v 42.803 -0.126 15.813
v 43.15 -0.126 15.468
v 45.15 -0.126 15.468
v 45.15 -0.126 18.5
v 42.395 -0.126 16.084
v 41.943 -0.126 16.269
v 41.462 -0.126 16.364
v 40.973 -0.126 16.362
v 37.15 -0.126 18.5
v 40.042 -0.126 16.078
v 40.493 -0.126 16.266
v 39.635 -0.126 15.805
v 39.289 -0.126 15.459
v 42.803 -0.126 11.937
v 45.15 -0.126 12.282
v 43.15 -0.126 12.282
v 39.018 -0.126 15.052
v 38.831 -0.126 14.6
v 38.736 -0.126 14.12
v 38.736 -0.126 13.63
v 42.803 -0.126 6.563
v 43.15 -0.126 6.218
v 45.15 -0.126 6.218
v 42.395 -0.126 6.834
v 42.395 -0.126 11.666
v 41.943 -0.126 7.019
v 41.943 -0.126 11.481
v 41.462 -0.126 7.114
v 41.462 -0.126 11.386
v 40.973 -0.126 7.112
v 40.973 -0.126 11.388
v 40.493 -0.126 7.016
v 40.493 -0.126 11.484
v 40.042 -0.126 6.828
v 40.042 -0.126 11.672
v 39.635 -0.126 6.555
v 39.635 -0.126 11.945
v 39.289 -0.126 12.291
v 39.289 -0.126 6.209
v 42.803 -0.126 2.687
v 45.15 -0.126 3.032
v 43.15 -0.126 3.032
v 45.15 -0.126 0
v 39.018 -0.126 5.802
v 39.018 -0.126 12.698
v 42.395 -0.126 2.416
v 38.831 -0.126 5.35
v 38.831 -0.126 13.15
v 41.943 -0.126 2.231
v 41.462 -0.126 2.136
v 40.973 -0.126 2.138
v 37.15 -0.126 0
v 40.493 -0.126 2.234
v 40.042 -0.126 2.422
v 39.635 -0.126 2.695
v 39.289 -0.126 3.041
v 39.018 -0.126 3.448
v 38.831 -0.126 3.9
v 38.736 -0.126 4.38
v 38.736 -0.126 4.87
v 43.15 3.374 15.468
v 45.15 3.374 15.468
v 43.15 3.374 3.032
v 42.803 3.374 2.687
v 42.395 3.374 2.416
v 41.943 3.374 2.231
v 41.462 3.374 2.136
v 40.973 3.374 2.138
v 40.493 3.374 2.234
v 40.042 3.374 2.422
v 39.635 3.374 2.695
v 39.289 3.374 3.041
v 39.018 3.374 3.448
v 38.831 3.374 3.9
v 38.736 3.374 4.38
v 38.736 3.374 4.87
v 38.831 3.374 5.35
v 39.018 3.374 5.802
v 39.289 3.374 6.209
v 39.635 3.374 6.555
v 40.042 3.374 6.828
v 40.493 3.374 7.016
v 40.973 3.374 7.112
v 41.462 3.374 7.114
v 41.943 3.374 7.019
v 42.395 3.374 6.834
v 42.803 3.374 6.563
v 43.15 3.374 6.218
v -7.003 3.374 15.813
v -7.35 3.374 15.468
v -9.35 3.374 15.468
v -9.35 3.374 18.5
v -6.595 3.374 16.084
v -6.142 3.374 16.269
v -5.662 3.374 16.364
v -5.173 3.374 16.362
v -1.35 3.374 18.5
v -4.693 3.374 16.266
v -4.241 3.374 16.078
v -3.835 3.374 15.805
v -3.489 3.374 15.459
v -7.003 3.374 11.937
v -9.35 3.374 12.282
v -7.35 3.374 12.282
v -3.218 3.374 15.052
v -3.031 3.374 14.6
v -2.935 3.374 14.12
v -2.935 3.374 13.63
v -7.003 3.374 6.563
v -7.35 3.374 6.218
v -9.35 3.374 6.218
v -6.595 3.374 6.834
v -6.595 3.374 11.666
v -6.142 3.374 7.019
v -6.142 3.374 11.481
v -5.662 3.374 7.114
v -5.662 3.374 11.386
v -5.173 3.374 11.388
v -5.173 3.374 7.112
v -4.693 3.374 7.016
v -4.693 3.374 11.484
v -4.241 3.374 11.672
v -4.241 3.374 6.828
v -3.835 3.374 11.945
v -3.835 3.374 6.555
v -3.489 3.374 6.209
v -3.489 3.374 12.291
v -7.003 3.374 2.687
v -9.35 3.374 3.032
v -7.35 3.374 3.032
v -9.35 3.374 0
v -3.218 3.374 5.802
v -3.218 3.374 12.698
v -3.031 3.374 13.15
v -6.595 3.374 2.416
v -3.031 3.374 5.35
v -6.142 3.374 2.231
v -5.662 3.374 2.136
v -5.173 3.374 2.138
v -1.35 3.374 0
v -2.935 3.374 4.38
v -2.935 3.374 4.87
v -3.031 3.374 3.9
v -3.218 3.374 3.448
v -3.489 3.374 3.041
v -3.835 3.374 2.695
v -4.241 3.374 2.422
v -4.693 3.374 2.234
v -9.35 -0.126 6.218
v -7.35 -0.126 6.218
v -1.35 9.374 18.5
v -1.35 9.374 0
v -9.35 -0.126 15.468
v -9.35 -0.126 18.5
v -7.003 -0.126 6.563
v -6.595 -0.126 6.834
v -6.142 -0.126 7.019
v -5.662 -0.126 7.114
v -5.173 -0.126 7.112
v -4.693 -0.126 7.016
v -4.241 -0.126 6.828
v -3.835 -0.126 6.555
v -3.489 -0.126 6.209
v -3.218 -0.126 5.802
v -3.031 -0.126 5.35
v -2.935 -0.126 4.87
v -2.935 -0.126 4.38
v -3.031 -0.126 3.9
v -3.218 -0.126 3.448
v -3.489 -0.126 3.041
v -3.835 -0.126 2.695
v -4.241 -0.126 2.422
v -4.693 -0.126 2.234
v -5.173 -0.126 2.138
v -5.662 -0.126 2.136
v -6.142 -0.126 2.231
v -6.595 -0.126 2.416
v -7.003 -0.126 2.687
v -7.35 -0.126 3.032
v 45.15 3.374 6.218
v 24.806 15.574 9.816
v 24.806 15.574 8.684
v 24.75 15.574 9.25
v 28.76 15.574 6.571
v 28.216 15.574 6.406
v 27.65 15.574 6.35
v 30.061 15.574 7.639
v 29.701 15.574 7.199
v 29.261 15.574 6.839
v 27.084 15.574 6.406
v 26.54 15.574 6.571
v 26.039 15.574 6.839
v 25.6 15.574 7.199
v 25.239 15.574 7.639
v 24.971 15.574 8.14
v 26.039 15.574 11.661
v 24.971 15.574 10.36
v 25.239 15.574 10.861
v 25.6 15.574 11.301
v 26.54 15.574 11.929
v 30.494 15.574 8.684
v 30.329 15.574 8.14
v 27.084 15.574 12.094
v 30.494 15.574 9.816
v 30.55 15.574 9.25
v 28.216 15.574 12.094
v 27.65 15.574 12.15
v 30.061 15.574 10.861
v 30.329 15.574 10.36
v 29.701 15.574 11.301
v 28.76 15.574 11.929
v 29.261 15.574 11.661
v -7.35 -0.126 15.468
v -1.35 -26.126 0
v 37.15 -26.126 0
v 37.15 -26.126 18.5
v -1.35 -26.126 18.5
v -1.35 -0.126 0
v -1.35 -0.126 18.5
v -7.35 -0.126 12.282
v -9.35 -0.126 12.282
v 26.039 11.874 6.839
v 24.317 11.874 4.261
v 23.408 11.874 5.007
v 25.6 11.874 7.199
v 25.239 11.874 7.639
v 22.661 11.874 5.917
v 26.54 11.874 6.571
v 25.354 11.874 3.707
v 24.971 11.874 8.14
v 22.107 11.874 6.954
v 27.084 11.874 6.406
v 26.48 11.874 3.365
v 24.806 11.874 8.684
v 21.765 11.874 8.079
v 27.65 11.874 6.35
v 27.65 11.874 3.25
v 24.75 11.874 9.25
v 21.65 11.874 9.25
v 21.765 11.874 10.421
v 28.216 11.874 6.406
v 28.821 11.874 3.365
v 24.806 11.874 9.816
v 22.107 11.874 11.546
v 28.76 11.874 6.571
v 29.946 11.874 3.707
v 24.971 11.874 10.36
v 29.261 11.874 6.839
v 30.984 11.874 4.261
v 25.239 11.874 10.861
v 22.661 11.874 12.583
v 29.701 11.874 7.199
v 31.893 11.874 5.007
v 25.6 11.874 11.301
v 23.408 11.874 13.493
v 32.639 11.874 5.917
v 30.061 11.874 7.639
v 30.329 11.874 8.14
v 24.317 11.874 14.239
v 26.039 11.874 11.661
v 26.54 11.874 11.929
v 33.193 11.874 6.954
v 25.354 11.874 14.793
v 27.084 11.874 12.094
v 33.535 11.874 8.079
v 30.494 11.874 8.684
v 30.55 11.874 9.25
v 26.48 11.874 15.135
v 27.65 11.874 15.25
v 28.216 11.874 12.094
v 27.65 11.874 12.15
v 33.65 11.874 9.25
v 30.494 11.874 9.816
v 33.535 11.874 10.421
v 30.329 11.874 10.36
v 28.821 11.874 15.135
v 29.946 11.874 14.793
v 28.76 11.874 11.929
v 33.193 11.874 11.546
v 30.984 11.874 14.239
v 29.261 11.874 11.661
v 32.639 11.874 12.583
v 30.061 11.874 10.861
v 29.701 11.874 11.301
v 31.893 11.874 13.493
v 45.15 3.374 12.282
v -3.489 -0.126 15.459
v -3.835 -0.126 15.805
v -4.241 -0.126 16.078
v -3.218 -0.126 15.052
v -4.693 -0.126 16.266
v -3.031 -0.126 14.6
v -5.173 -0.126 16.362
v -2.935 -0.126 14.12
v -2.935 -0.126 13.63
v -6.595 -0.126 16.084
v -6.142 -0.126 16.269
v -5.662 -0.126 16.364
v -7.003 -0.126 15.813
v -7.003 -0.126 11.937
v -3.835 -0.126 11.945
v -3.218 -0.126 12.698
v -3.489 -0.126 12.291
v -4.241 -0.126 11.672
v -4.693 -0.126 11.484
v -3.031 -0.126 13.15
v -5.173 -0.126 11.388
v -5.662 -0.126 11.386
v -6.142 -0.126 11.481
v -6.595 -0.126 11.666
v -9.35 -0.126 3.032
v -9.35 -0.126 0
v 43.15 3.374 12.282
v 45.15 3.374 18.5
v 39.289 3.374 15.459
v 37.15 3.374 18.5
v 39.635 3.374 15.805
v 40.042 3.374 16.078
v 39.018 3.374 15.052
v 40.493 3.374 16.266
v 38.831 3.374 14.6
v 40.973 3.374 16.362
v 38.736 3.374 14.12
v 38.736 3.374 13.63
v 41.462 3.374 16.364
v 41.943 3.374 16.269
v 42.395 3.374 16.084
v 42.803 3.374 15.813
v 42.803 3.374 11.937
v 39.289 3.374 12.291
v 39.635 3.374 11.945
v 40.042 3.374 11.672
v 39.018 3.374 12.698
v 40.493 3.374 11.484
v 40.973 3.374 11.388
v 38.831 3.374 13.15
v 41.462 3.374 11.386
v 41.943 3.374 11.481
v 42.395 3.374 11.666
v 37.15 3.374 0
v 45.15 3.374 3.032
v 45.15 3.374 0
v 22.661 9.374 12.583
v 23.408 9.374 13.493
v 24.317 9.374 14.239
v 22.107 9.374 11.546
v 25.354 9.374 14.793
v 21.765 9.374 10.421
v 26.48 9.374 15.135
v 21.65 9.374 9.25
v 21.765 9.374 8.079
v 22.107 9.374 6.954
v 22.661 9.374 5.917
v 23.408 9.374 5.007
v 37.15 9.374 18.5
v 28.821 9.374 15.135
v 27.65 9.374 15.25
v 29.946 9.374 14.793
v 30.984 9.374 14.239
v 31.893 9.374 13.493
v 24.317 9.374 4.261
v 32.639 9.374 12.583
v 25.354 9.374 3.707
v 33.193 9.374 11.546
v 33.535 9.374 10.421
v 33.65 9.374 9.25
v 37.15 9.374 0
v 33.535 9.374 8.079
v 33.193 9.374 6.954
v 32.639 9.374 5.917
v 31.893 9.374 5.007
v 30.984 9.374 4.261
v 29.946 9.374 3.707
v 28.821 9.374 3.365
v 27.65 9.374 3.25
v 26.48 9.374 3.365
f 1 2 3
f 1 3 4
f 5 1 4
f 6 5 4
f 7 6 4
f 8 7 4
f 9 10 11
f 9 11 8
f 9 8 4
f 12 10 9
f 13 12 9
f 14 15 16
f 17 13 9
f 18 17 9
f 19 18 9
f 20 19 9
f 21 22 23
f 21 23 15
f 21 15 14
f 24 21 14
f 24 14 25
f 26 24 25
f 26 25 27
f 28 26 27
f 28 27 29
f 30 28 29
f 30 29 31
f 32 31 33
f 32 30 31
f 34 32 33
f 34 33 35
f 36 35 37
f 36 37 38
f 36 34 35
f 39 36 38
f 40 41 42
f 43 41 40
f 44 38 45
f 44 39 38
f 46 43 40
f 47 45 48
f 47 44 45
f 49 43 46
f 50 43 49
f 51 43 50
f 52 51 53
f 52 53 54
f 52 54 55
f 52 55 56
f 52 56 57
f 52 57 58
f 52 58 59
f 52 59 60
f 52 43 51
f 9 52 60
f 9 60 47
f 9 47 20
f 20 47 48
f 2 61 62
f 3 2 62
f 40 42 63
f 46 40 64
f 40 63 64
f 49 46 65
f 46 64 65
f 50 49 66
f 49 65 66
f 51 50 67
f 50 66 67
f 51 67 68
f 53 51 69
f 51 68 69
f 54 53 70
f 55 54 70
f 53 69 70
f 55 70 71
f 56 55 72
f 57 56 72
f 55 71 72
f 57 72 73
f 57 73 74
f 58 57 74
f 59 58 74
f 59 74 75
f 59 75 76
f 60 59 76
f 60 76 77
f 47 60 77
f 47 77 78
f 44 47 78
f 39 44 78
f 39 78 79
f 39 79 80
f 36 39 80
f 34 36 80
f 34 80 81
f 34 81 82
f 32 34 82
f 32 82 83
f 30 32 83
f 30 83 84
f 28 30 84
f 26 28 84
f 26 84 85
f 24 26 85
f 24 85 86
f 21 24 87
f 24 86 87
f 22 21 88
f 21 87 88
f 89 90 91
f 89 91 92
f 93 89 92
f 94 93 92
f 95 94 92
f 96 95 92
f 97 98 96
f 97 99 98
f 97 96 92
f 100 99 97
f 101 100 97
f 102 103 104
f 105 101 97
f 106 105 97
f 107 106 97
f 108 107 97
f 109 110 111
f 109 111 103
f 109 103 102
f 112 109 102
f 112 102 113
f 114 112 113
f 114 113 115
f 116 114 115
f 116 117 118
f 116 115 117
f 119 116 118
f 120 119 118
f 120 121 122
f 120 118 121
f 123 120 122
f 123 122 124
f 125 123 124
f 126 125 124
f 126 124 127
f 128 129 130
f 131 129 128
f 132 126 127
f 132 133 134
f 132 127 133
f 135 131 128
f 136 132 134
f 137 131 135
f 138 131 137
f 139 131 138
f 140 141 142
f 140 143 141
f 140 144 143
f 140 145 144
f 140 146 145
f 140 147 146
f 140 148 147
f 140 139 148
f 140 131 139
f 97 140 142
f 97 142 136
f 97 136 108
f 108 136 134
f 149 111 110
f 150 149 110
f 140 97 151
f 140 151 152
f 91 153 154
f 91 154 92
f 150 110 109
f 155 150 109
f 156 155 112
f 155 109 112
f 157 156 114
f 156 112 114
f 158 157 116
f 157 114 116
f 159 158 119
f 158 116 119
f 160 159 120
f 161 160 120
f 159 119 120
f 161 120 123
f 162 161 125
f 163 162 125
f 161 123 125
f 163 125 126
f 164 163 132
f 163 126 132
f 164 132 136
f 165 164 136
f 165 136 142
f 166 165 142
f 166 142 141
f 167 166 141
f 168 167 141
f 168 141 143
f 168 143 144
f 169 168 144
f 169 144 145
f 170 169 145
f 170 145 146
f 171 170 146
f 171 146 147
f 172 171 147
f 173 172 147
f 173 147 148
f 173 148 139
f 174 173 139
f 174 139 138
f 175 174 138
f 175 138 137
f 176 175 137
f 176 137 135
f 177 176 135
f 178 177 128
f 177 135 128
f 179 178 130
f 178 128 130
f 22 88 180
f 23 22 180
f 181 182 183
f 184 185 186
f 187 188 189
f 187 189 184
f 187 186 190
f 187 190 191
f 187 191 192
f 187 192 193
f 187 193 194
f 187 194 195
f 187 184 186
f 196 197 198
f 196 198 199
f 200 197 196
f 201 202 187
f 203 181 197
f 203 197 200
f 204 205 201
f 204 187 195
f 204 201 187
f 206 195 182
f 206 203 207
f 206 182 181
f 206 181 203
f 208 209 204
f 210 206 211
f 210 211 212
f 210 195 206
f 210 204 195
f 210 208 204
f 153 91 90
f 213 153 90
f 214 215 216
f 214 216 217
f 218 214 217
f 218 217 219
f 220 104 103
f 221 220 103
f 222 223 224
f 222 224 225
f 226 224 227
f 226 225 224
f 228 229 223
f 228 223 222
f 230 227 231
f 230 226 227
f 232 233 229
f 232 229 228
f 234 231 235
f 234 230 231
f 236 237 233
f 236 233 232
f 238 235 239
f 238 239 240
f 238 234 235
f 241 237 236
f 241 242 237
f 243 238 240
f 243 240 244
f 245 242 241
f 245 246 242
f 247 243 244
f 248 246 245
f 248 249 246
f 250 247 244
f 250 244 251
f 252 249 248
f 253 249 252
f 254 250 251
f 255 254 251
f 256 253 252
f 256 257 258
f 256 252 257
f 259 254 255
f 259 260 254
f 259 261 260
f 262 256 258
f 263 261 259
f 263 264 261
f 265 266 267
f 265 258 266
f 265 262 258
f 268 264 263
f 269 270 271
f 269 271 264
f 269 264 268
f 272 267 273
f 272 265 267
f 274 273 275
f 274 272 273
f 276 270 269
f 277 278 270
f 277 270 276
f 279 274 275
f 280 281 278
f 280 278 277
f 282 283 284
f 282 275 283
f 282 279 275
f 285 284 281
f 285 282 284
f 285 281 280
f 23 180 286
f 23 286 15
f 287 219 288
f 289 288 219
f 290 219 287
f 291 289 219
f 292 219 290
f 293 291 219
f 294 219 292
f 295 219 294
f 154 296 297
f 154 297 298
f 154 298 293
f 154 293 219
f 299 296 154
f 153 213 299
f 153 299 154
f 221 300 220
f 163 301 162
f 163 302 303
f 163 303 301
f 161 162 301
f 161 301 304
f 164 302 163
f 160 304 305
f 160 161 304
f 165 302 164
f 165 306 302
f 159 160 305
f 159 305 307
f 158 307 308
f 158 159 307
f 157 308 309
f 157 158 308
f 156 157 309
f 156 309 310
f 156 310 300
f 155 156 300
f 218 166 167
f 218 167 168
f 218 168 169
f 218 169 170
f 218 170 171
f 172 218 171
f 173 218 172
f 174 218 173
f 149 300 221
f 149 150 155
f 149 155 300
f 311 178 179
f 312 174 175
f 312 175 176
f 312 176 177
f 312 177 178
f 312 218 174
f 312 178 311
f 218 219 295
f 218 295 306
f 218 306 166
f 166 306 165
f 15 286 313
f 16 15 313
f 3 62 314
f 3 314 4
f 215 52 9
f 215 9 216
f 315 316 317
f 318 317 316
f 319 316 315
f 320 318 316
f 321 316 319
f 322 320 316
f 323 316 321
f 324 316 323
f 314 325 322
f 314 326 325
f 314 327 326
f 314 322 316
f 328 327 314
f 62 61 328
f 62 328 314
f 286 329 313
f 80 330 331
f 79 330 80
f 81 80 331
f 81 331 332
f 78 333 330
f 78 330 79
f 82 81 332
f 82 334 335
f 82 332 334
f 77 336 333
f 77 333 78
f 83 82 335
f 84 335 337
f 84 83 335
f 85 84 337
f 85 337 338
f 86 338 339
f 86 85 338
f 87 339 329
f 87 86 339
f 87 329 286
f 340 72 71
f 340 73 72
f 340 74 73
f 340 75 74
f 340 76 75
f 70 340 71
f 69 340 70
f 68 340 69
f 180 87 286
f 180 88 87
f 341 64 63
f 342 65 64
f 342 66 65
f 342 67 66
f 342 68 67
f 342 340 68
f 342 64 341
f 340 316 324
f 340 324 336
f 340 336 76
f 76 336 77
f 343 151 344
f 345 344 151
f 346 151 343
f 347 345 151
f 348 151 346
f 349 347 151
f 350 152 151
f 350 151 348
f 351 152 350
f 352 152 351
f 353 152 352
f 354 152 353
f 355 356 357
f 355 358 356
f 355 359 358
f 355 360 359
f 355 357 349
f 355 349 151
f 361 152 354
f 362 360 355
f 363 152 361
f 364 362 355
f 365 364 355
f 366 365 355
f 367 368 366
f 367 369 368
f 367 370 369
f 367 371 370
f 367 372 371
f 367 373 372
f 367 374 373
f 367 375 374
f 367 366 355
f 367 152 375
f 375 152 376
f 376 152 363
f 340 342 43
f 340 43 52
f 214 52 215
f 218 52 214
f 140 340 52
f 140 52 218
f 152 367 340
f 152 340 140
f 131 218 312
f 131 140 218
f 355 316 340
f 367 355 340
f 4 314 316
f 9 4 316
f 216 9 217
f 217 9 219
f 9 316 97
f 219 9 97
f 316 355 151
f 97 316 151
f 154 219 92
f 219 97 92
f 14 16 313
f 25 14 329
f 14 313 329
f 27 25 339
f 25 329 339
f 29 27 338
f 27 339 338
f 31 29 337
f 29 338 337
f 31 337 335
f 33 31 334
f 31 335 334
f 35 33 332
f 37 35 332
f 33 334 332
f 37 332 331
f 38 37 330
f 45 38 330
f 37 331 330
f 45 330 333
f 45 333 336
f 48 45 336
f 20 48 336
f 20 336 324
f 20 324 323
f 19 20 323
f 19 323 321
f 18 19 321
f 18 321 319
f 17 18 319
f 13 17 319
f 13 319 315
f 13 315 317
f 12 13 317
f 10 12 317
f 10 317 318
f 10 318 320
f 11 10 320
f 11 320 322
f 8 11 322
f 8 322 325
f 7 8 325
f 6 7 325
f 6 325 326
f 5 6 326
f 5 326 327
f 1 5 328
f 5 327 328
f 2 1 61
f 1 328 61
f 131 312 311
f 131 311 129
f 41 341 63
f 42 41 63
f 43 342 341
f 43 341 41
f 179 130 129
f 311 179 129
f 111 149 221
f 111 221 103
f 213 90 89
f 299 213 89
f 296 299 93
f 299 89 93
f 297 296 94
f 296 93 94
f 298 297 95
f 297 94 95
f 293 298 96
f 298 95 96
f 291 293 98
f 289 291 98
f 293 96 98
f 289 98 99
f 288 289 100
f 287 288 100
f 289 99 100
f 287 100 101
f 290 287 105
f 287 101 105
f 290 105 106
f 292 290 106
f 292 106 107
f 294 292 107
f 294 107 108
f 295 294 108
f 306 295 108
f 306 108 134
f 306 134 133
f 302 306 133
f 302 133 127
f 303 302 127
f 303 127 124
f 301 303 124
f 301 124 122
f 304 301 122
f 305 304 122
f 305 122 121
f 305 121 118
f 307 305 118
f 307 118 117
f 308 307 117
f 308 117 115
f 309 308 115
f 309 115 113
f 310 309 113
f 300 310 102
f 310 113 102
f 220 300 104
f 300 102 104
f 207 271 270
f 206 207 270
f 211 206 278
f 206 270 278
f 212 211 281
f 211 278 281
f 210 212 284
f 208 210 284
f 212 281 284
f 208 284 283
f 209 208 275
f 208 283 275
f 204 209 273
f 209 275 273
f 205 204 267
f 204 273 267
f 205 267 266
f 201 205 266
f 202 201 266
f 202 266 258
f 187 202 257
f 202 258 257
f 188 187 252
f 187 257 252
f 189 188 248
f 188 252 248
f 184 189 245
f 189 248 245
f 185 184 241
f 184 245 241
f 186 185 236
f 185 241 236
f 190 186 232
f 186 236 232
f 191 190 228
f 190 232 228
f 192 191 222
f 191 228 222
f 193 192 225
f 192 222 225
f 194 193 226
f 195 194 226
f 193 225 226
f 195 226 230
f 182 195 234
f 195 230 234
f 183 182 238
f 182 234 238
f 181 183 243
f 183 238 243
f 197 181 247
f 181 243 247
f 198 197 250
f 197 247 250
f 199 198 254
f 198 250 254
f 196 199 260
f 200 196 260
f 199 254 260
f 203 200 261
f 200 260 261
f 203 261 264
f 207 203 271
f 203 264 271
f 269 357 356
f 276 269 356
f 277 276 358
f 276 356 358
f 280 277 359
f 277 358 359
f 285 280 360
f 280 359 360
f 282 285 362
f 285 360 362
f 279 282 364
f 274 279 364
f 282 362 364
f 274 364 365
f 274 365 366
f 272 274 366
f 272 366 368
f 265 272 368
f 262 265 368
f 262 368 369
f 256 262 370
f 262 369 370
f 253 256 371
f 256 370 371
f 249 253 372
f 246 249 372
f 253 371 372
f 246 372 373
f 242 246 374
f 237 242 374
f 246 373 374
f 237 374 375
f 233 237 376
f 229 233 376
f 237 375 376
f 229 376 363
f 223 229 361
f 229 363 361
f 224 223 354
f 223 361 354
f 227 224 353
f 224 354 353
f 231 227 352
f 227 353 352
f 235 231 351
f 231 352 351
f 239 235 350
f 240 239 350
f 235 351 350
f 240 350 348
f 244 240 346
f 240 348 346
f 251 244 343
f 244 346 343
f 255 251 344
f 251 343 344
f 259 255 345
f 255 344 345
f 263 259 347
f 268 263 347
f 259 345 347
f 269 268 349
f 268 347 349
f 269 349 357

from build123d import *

# Parameters (mm, degrees)
BOSS_EXTRU_1_DEPTH      = 18.5
ENL_V_MAT_EXTRU_1_DEPTH = 58.017897583
ESQUISSE4_W             = 38.5
ESQUISSE4_H             = 18.5
BOSS_EXTRU_2_DEPTH      = 6
ESQUISSE6_R             = 6
BOSS_EXTRU_3_DEPTH      = 2.5
ESQUISSE7_R             = 2.9
BOSS_EXTRU_4_DEPTH      = 3.7


with BuildPart() as part:
    # Esquisse2 → Boss.-Extru.1 (new body)
    with BuildSketch(Plane.XY):
        Polygon((-9.349799062, -0.125566913), (-9.349799062, 3.374433087), (45.150200938, 3.374433087), (45.150200938, -0.125566913), (37.150200938, -0.125566913), (37.150200938, -26.125566913), (-1.349799062, -26.125566913), (-1.349799062, -0.125566913), align=None)
    extrude(amount=BOSS_EXTRU_1_DEPTH)

    # Esquisse3 → Enlèv. mat.-Extru.1 (cut, through all)
    with BuildSketch(Plane(origin=(0, 3.374433087, 0), x_dir=(1, 0, 0), z_dir=(0, 1, 0))):
        with BuildLine():
            Line((-9.349799062, -15.468288585), (-7.349799062, -15.468288585))
            ThreePointArc((-7.349799062, -15.468288585), (-2.923291475, -13.875), (-7.349799062, -12.281711415))
            Line((-7.349799062, -12.281711415), (-9.349799062, -12.281711415))
            Line((-9.349799062, -12.281711415), (-9.349799062, -15.468288585))
        make_face()
        with BuildLine():
            Line((45.150200938, -12.281711415), (43.150200938, -12.281711415))
            ThreePointArc((43.150200938, -12.281711415), (38.723693351, -13.875), (43.150200938, -15.468288585))
            Line((43.150200938, -15.468288585), (45.150200938, -15.468288585))
            Line((45.150200938, -15.468288585), (45.150200938, -12.281711415))
        make_face()
        with BuildLine():
            Line((-9.349799062, -6.218288585), (-7.349799062, -6.218288585))
            ThreePointArc((-7.349799062, -6.218288585), (-2.923291475, -4.625), (-7.349799062, -3.031711415))
            Line((-7.349799062, -3.031711415), (-9.349799062, -3.031711415))
            Line((-9.349799062, -3.031711415), (-9.349799062, -6.218288585))
        make_face()
        with BuildLine():
            Line((45.150200938, -3.031711415), (43.150200938, -3.031711415))
            ThreePointArc((43.150200938, -3.031711415), (38.723693351, -4.625), (43.150200938, -6.218288585))
            Line((43.150200938, -6.218288585), (45.150200938, -6.218288585))
            Line((45.150200938, -6.218288585), (45.150200938, -3.031711415))
        make_face()
    extrude(amount=-ENL_V_MAT_EXTRU_1_DEPTH, mode=Mode.SUBTRACT)

    # Esquisse4 → Boss.-Extru.2 (add)
    with BuildSketch(Plane(origin=(0, 3.374433087, 0), x_dir=(1, 0, 0), z_dir=(0, 1, 0))):
        with Locations((17.900200938, -9.25)):
            Rectangle(ESQUISSE4_W, ESQUISSE4_H)
    extrude(amount=BOSS_EXTRU_2_DEPTH)

    # Esquisse6 → Boss.-Extru.3 (add)
    with BuildSketch(Plane(origin=(0, 9.374433087, 0), x_dir=(1, 0, 0), z_dir=(0, 1, 0))):
        with Locations(Location((27.650200938, -9.25, 0), (0, 0, 270))):
            Circle(ESQUISSE6_R)
    extrude(amount=BOSS_EXTRU_3_DEPTH)

    # Esquisse7 → Boss.-Extru.4 (add)
    with BuildSketch(Plane(origin=(0, 11.874433087, 0), x_dir=(1, 0, 0), z_dir=(0, 1, 0))):
        with Locations(Location((27.650200938, -9.25, 0), (0, 0, 270))):
            Circle(ESQUISSE7_R)
    extrude(amount=BOSS_EXTRU_4_DEPTH)


solid = part.part
